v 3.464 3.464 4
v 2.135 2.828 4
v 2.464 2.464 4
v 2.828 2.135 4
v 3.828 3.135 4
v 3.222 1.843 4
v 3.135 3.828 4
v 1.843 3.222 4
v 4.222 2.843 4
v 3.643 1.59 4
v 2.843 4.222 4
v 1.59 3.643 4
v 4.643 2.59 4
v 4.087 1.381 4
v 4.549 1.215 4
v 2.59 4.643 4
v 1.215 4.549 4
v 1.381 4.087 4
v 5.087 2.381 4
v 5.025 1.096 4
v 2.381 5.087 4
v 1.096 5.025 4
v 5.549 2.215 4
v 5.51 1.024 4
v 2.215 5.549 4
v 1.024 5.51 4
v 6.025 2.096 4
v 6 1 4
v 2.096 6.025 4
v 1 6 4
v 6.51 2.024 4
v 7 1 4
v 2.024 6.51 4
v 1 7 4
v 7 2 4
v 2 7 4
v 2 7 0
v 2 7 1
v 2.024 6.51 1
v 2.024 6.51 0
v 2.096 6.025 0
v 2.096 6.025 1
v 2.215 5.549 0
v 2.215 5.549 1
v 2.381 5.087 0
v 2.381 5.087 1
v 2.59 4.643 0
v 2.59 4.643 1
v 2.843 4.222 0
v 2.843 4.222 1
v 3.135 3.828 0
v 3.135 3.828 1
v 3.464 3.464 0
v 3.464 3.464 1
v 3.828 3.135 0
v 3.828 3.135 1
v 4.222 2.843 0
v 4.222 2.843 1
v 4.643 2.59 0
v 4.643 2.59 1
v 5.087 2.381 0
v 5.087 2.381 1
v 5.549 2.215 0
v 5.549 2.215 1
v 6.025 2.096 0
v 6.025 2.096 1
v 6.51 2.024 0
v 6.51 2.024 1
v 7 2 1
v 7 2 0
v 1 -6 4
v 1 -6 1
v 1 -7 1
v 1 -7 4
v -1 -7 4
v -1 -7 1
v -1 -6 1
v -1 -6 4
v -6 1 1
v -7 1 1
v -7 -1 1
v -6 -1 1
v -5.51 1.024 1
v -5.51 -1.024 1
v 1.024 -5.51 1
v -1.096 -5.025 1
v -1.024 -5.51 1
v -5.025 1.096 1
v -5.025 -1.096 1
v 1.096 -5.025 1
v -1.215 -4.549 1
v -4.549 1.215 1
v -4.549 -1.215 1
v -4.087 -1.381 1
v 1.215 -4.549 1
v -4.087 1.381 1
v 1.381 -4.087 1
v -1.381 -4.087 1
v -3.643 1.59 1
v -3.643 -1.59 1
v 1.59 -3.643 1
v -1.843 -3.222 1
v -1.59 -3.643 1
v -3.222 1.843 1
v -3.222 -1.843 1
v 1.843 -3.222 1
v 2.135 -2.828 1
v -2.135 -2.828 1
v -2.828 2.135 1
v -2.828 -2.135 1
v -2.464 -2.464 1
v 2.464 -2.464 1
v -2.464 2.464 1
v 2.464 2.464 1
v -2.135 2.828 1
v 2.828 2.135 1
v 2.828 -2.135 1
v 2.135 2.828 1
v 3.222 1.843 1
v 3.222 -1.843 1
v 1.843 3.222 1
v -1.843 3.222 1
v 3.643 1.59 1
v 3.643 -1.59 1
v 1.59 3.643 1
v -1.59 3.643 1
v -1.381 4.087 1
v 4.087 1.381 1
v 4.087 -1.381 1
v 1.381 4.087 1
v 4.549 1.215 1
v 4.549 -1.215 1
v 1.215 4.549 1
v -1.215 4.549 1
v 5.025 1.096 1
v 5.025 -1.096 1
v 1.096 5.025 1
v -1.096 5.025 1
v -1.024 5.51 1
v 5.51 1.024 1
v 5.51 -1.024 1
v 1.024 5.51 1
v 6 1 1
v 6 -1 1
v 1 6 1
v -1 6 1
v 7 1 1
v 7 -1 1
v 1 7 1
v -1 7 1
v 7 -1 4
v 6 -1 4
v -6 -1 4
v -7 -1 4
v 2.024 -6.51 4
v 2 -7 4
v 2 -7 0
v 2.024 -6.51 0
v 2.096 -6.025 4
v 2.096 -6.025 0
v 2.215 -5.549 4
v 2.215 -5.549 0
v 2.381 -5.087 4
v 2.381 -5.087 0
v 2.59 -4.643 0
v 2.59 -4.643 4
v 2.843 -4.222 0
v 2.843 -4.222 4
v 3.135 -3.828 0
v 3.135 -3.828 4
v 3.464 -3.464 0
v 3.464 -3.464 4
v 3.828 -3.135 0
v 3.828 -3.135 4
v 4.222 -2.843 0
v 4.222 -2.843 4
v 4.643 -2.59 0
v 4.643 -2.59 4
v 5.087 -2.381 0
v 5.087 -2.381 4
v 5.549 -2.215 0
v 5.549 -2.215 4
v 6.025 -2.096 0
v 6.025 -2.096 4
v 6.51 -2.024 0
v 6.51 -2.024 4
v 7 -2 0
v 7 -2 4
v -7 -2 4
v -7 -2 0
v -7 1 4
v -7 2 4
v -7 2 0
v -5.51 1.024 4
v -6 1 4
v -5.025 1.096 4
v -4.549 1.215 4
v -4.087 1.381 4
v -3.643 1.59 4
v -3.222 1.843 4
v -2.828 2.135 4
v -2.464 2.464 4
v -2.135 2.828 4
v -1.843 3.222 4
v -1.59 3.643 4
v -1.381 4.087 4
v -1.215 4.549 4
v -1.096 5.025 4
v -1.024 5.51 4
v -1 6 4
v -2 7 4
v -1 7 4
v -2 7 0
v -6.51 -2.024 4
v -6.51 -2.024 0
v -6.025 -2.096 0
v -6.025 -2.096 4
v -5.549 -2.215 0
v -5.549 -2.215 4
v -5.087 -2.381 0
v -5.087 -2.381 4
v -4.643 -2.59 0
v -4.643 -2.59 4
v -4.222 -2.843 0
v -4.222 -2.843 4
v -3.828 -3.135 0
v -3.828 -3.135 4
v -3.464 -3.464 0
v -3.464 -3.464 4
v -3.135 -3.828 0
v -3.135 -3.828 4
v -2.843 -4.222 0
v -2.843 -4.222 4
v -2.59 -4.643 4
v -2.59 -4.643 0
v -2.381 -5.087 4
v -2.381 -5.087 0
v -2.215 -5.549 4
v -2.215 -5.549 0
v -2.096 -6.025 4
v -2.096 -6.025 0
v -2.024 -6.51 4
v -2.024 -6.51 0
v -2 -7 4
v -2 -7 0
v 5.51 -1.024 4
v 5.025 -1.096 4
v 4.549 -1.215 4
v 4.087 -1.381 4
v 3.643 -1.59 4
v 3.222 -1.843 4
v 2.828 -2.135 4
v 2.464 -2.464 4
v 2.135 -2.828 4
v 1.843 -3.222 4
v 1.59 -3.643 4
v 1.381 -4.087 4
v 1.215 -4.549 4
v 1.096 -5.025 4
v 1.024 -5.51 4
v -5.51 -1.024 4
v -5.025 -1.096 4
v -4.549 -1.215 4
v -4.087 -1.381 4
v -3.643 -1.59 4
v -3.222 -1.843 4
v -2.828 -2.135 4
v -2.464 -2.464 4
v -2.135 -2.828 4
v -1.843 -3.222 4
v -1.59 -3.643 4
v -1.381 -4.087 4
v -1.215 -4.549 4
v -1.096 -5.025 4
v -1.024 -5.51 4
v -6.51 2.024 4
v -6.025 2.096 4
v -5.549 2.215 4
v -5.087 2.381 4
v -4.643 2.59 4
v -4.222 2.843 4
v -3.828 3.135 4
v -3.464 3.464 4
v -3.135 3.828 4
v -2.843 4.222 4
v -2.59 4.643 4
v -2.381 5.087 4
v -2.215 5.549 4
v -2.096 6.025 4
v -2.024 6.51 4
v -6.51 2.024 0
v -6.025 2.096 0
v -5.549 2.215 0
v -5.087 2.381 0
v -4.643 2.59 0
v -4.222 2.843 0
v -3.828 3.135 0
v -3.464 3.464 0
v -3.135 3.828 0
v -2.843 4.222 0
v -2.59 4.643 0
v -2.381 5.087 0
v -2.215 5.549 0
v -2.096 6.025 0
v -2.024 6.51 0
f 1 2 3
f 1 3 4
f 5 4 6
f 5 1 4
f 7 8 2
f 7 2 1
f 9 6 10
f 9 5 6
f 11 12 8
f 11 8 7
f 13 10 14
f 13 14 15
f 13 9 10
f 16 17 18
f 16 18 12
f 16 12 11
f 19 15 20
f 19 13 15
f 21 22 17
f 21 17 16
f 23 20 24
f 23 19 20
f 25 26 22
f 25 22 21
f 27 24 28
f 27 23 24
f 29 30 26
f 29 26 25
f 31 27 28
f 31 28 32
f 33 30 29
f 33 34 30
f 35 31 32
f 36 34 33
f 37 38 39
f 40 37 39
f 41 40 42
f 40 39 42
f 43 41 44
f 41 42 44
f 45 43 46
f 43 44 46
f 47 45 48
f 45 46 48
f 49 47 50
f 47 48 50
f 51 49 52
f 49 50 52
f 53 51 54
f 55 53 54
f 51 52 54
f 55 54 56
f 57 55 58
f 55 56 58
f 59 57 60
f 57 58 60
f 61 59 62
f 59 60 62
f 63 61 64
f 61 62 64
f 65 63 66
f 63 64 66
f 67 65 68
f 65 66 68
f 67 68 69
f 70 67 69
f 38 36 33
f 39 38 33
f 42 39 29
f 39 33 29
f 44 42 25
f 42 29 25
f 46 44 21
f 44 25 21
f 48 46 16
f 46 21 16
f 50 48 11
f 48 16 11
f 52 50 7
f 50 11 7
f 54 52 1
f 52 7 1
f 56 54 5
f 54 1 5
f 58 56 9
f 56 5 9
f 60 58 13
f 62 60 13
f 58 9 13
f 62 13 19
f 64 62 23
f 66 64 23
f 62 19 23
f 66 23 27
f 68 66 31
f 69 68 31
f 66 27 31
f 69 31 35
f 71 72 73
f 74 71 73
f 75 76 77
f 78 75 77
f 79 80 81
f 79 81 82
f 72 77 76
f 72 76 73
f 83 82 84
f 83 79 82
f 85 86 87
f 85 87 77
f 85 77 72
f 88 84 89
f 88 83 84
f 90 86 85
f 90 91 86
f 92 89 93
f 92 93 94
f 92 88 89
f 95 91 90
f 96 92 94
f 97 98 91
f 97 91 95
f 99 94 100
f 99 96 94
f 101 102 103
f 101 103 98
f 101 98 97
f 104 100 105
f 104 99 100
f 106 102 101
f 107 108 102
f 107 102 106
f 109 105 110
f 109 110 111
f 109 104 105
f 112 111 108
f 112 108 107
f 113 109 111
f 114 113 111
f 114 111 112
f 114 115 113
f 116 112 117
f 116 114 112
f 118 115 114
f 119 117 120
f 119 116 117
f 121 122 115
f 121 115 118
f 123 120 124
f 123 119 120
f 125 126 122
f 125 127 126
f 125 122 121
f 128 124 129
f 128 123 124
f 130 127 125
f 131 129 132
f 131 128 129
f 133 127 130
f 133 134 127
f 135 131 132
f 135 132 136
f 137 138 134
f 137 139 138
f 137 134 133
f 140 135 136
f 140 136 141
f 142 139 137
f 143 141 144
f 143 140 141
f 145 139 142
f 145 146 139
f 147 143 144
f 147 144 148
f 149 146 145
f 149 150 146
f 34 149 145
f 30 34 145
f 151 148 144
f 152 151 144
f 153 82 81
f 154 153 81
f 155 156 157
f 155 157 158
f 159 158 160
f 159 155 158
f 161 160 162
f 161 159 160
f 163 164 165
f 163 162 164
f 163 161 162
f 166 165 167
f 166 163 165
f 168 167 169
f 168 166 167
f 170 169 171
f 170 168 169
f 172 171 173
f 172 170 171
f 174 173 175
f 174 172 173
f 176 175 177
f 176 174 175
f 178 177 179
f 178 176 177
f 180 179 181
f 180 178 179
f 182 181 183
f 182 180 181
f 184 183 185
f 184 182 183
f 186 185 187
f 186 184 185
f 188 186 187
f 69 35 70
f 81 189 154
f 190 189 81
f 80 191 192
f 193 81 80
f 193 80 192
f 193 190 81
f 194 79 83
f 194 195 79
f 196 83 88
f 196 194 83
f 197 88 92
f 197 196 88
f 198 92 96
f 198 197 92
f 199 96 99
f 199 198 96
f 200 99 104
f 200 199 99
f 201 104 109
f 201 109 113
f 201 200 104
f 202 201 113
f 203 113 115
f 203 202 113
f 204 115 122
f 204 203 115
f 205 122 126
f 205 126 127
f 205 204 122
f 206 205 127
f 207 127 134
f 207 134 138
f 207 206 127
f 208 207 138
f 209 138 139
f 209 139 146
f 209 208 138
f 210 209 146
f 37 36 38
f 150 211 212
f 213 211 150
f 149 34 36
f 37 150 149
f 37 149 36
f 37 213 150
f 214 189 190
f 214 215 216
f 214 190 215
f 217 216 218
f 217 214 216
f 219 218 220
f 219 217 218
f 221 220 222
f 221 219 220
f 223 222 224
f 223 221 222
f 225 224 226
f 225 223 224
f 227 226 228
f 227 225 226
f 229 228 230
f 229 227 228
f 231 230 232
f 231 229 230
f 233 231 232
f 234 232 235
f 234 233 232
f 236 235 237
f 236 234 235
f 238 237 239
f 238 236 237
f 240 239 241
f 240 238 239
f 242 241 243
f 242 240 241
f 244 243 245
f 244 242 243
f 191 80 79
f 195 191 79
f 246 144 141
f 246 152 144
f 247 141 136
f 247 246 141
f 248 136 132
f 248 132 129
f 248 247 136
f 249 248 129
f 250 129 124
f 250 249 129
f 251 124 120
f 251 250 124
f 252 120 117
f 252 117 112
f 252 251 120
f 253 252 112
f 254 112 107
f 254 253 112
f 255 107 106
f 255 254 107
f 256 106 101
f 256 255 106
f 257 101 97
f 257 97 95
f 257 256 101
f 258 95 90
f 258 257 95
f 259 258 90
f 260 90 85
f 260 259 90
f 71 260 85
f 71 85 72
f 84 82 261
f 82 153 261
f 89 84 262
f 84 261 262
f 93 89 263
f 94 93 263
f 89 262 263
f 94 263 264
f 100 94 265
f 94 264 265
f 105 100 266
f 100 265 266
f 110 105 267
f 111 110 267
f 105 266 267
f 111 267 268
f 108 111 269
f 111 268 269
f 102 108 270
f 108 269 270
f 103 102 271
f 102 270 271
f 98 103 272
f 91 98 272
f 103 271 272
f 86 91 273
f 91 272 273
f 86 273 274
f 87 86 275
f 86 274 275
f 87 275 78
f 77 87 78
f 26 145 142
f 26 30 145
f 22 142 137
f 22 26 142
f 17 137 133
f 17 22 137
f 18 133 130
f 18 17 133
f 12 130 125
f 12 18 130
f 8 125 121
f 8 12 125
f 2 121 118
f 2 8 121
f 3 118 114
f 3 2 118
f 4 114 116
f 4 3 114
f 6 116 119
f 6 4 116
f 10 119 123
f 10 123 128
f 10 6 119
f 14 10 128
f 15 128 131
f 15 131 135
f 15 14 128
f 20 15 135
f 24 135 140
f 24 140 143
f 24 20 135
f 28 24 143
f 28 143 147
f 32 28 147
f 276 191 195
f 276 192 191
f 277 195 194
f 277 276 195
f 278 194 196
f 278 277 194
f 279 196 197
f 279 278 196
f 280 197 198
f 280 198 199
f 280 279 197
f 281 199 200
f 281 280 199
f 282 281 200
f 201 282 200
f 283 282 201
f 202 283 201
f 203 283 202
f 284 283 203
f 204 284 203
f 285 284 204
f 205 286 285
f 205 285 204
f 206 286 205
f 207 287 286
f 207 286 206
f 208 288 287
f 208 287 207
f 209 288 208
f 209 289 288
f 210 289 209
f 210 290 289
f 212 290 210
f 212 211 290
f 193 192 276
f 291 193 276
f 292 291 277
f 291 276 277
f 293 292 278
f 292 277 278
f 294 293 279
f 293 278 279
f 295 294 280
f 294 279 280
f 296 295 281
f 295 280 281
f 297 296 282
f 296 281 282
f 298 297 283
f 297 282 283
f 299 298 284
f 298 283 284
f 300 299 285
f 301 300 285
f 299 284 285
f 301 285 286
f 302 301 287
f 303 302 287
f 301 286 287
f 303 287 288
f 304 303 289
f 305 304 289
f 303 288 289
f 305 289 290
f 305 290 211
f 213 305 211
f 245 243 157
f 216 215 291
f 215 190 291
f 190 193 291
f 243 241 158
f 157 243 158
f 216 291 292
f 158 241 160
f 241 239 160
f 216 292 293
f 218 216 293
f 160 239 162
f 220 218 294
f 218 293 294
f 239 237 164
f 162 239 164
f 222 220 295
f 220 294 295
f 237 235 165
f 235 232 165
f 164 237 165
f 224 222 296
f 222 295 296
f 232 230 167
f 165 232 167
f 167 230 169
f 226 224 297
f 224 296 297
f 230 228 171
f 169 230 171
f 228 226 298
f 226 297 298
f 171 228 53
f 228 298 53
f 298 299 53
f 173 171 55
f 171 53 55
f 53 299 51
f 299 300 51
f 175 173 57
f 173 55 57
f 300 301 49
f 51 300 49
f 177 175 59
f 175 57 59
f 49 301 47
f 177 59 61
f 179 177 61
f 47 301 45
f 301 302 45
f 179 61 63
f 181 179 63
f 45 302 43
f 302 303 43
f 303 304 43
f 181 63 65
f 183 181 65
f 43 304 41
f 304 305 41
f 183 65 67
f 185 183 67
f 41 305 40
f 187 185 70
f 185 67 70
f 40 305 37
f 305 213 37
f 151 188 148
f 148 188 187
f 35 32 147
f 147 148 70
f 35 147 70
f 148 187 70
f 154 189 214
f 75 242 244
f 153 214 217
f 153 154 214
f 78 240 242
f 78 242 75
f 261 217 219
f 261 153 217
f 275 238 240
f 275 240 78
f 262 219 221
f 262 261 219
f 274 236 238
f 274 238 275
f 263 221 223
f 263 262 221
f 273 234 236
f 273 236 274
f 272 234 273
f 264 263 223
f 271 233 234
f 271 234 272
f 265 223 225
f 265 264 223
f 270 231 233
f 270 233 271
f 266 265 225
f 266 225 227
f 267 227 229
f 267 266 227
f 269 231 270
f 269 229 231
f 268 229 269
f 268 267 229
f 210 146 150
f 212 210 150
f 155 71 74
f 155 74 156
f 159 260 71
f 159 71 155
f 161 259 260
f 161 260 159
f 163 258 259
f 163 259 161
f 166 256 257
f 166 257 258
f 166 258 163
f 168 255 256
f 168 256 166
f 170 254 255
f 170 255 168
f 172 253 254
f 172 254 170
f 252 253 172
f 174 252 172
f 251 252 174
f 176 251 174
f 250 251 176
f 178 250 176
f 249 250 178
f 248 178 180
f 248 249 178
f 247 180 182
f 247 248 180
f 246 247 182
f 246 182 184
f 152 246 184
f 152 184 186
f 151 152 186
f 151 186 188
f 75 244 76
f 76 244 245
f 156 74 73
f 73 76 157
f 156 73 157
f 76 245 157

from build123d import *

# Parameters (mm, degrees)
F0_W     = 14
F0_H     = 14
F1_DEPTH = 1
F2_W     = 5
F2_H     = 1
F3_DEPTH = 3
F4_R     = 4.99999
F5_DEPTH = 25


# Not quite as in the source:
# - a fillet or chamfer is up to 0.001 mm smaller than in the source, because OpenCascade refuses the exact size


with BuildPart() as f1:
    # F0 (on Top) → F1 (new body)
    with BuildSketch(Plane.XY):
        Rectangle(F0_W, F0_H)
    extrude(amount=F1_DEPTH)

    # F2 (on face) → F3 (join)
    with BuildSketch(Plane.XY.offset(1)):
        Polygon((-1, 1), (-1, 7), (-2, 7), (-2, 2), (-2, 1), align=None)
        with Locations((-4.5, 1.5)):
            Rectangle(F2_W, F2_H)
        Polygon((1, 1), (2, 1), (2, 2), (2, 7), (1, 7), align=None)
        with Locations((4.5, 1.5)):
            Rectangle(F2_W, F2_H)
        with Locations((4.5, -1.5)):
            Rectangle(F2_W, F2_H)
        Polygon((2, -1), (1, -1), (1, -7), (2, -7), (2, -2), align=None)
        with Locations((-4.5, -1.5)):
            Rectangle(F2_W, F2_H)
        Polygon((-2, -7), (-1, -7), (-1, -1), (-2, -1), (-2, -2), align=None)
    extrude(amount=F3_DEPTH)

    # F4 (radius 5 in the source; OpenCascade refuses exactly that, so slightly less here)
    f4_edges = [f1.edges().sort_by_distance(p)[0] for p in [
        (2, -2, 2.5),
        (-1, -1, 2.5),
        (-1, 1, 2.5),
        (1, 1, 2.5),
        (2, 2, 2.5),
        (-2, 2, 2.5),
        (-2, -2, 2.5),
        (1, -1, 2.5),
    ]]
    fillet(f4_edges, radius=F4_R)

    # F5 (cut): faces of the model
    f5_faces = [f1.faces().sort_by_distance(p)[0] for p in [
        (4.8779327776, -4.8779327776, 1),
        (4.8779327776, 4.8779327776, 1),
        (-4.8779327776, 4.8779327776, 1),
        (-4.8779327776, -4.8779327776, 1),
    ]]
    extrude(f5_faces, amount=-F5_DEPTH, mode=Mode.SUBTRACT)


solid = f1.part
